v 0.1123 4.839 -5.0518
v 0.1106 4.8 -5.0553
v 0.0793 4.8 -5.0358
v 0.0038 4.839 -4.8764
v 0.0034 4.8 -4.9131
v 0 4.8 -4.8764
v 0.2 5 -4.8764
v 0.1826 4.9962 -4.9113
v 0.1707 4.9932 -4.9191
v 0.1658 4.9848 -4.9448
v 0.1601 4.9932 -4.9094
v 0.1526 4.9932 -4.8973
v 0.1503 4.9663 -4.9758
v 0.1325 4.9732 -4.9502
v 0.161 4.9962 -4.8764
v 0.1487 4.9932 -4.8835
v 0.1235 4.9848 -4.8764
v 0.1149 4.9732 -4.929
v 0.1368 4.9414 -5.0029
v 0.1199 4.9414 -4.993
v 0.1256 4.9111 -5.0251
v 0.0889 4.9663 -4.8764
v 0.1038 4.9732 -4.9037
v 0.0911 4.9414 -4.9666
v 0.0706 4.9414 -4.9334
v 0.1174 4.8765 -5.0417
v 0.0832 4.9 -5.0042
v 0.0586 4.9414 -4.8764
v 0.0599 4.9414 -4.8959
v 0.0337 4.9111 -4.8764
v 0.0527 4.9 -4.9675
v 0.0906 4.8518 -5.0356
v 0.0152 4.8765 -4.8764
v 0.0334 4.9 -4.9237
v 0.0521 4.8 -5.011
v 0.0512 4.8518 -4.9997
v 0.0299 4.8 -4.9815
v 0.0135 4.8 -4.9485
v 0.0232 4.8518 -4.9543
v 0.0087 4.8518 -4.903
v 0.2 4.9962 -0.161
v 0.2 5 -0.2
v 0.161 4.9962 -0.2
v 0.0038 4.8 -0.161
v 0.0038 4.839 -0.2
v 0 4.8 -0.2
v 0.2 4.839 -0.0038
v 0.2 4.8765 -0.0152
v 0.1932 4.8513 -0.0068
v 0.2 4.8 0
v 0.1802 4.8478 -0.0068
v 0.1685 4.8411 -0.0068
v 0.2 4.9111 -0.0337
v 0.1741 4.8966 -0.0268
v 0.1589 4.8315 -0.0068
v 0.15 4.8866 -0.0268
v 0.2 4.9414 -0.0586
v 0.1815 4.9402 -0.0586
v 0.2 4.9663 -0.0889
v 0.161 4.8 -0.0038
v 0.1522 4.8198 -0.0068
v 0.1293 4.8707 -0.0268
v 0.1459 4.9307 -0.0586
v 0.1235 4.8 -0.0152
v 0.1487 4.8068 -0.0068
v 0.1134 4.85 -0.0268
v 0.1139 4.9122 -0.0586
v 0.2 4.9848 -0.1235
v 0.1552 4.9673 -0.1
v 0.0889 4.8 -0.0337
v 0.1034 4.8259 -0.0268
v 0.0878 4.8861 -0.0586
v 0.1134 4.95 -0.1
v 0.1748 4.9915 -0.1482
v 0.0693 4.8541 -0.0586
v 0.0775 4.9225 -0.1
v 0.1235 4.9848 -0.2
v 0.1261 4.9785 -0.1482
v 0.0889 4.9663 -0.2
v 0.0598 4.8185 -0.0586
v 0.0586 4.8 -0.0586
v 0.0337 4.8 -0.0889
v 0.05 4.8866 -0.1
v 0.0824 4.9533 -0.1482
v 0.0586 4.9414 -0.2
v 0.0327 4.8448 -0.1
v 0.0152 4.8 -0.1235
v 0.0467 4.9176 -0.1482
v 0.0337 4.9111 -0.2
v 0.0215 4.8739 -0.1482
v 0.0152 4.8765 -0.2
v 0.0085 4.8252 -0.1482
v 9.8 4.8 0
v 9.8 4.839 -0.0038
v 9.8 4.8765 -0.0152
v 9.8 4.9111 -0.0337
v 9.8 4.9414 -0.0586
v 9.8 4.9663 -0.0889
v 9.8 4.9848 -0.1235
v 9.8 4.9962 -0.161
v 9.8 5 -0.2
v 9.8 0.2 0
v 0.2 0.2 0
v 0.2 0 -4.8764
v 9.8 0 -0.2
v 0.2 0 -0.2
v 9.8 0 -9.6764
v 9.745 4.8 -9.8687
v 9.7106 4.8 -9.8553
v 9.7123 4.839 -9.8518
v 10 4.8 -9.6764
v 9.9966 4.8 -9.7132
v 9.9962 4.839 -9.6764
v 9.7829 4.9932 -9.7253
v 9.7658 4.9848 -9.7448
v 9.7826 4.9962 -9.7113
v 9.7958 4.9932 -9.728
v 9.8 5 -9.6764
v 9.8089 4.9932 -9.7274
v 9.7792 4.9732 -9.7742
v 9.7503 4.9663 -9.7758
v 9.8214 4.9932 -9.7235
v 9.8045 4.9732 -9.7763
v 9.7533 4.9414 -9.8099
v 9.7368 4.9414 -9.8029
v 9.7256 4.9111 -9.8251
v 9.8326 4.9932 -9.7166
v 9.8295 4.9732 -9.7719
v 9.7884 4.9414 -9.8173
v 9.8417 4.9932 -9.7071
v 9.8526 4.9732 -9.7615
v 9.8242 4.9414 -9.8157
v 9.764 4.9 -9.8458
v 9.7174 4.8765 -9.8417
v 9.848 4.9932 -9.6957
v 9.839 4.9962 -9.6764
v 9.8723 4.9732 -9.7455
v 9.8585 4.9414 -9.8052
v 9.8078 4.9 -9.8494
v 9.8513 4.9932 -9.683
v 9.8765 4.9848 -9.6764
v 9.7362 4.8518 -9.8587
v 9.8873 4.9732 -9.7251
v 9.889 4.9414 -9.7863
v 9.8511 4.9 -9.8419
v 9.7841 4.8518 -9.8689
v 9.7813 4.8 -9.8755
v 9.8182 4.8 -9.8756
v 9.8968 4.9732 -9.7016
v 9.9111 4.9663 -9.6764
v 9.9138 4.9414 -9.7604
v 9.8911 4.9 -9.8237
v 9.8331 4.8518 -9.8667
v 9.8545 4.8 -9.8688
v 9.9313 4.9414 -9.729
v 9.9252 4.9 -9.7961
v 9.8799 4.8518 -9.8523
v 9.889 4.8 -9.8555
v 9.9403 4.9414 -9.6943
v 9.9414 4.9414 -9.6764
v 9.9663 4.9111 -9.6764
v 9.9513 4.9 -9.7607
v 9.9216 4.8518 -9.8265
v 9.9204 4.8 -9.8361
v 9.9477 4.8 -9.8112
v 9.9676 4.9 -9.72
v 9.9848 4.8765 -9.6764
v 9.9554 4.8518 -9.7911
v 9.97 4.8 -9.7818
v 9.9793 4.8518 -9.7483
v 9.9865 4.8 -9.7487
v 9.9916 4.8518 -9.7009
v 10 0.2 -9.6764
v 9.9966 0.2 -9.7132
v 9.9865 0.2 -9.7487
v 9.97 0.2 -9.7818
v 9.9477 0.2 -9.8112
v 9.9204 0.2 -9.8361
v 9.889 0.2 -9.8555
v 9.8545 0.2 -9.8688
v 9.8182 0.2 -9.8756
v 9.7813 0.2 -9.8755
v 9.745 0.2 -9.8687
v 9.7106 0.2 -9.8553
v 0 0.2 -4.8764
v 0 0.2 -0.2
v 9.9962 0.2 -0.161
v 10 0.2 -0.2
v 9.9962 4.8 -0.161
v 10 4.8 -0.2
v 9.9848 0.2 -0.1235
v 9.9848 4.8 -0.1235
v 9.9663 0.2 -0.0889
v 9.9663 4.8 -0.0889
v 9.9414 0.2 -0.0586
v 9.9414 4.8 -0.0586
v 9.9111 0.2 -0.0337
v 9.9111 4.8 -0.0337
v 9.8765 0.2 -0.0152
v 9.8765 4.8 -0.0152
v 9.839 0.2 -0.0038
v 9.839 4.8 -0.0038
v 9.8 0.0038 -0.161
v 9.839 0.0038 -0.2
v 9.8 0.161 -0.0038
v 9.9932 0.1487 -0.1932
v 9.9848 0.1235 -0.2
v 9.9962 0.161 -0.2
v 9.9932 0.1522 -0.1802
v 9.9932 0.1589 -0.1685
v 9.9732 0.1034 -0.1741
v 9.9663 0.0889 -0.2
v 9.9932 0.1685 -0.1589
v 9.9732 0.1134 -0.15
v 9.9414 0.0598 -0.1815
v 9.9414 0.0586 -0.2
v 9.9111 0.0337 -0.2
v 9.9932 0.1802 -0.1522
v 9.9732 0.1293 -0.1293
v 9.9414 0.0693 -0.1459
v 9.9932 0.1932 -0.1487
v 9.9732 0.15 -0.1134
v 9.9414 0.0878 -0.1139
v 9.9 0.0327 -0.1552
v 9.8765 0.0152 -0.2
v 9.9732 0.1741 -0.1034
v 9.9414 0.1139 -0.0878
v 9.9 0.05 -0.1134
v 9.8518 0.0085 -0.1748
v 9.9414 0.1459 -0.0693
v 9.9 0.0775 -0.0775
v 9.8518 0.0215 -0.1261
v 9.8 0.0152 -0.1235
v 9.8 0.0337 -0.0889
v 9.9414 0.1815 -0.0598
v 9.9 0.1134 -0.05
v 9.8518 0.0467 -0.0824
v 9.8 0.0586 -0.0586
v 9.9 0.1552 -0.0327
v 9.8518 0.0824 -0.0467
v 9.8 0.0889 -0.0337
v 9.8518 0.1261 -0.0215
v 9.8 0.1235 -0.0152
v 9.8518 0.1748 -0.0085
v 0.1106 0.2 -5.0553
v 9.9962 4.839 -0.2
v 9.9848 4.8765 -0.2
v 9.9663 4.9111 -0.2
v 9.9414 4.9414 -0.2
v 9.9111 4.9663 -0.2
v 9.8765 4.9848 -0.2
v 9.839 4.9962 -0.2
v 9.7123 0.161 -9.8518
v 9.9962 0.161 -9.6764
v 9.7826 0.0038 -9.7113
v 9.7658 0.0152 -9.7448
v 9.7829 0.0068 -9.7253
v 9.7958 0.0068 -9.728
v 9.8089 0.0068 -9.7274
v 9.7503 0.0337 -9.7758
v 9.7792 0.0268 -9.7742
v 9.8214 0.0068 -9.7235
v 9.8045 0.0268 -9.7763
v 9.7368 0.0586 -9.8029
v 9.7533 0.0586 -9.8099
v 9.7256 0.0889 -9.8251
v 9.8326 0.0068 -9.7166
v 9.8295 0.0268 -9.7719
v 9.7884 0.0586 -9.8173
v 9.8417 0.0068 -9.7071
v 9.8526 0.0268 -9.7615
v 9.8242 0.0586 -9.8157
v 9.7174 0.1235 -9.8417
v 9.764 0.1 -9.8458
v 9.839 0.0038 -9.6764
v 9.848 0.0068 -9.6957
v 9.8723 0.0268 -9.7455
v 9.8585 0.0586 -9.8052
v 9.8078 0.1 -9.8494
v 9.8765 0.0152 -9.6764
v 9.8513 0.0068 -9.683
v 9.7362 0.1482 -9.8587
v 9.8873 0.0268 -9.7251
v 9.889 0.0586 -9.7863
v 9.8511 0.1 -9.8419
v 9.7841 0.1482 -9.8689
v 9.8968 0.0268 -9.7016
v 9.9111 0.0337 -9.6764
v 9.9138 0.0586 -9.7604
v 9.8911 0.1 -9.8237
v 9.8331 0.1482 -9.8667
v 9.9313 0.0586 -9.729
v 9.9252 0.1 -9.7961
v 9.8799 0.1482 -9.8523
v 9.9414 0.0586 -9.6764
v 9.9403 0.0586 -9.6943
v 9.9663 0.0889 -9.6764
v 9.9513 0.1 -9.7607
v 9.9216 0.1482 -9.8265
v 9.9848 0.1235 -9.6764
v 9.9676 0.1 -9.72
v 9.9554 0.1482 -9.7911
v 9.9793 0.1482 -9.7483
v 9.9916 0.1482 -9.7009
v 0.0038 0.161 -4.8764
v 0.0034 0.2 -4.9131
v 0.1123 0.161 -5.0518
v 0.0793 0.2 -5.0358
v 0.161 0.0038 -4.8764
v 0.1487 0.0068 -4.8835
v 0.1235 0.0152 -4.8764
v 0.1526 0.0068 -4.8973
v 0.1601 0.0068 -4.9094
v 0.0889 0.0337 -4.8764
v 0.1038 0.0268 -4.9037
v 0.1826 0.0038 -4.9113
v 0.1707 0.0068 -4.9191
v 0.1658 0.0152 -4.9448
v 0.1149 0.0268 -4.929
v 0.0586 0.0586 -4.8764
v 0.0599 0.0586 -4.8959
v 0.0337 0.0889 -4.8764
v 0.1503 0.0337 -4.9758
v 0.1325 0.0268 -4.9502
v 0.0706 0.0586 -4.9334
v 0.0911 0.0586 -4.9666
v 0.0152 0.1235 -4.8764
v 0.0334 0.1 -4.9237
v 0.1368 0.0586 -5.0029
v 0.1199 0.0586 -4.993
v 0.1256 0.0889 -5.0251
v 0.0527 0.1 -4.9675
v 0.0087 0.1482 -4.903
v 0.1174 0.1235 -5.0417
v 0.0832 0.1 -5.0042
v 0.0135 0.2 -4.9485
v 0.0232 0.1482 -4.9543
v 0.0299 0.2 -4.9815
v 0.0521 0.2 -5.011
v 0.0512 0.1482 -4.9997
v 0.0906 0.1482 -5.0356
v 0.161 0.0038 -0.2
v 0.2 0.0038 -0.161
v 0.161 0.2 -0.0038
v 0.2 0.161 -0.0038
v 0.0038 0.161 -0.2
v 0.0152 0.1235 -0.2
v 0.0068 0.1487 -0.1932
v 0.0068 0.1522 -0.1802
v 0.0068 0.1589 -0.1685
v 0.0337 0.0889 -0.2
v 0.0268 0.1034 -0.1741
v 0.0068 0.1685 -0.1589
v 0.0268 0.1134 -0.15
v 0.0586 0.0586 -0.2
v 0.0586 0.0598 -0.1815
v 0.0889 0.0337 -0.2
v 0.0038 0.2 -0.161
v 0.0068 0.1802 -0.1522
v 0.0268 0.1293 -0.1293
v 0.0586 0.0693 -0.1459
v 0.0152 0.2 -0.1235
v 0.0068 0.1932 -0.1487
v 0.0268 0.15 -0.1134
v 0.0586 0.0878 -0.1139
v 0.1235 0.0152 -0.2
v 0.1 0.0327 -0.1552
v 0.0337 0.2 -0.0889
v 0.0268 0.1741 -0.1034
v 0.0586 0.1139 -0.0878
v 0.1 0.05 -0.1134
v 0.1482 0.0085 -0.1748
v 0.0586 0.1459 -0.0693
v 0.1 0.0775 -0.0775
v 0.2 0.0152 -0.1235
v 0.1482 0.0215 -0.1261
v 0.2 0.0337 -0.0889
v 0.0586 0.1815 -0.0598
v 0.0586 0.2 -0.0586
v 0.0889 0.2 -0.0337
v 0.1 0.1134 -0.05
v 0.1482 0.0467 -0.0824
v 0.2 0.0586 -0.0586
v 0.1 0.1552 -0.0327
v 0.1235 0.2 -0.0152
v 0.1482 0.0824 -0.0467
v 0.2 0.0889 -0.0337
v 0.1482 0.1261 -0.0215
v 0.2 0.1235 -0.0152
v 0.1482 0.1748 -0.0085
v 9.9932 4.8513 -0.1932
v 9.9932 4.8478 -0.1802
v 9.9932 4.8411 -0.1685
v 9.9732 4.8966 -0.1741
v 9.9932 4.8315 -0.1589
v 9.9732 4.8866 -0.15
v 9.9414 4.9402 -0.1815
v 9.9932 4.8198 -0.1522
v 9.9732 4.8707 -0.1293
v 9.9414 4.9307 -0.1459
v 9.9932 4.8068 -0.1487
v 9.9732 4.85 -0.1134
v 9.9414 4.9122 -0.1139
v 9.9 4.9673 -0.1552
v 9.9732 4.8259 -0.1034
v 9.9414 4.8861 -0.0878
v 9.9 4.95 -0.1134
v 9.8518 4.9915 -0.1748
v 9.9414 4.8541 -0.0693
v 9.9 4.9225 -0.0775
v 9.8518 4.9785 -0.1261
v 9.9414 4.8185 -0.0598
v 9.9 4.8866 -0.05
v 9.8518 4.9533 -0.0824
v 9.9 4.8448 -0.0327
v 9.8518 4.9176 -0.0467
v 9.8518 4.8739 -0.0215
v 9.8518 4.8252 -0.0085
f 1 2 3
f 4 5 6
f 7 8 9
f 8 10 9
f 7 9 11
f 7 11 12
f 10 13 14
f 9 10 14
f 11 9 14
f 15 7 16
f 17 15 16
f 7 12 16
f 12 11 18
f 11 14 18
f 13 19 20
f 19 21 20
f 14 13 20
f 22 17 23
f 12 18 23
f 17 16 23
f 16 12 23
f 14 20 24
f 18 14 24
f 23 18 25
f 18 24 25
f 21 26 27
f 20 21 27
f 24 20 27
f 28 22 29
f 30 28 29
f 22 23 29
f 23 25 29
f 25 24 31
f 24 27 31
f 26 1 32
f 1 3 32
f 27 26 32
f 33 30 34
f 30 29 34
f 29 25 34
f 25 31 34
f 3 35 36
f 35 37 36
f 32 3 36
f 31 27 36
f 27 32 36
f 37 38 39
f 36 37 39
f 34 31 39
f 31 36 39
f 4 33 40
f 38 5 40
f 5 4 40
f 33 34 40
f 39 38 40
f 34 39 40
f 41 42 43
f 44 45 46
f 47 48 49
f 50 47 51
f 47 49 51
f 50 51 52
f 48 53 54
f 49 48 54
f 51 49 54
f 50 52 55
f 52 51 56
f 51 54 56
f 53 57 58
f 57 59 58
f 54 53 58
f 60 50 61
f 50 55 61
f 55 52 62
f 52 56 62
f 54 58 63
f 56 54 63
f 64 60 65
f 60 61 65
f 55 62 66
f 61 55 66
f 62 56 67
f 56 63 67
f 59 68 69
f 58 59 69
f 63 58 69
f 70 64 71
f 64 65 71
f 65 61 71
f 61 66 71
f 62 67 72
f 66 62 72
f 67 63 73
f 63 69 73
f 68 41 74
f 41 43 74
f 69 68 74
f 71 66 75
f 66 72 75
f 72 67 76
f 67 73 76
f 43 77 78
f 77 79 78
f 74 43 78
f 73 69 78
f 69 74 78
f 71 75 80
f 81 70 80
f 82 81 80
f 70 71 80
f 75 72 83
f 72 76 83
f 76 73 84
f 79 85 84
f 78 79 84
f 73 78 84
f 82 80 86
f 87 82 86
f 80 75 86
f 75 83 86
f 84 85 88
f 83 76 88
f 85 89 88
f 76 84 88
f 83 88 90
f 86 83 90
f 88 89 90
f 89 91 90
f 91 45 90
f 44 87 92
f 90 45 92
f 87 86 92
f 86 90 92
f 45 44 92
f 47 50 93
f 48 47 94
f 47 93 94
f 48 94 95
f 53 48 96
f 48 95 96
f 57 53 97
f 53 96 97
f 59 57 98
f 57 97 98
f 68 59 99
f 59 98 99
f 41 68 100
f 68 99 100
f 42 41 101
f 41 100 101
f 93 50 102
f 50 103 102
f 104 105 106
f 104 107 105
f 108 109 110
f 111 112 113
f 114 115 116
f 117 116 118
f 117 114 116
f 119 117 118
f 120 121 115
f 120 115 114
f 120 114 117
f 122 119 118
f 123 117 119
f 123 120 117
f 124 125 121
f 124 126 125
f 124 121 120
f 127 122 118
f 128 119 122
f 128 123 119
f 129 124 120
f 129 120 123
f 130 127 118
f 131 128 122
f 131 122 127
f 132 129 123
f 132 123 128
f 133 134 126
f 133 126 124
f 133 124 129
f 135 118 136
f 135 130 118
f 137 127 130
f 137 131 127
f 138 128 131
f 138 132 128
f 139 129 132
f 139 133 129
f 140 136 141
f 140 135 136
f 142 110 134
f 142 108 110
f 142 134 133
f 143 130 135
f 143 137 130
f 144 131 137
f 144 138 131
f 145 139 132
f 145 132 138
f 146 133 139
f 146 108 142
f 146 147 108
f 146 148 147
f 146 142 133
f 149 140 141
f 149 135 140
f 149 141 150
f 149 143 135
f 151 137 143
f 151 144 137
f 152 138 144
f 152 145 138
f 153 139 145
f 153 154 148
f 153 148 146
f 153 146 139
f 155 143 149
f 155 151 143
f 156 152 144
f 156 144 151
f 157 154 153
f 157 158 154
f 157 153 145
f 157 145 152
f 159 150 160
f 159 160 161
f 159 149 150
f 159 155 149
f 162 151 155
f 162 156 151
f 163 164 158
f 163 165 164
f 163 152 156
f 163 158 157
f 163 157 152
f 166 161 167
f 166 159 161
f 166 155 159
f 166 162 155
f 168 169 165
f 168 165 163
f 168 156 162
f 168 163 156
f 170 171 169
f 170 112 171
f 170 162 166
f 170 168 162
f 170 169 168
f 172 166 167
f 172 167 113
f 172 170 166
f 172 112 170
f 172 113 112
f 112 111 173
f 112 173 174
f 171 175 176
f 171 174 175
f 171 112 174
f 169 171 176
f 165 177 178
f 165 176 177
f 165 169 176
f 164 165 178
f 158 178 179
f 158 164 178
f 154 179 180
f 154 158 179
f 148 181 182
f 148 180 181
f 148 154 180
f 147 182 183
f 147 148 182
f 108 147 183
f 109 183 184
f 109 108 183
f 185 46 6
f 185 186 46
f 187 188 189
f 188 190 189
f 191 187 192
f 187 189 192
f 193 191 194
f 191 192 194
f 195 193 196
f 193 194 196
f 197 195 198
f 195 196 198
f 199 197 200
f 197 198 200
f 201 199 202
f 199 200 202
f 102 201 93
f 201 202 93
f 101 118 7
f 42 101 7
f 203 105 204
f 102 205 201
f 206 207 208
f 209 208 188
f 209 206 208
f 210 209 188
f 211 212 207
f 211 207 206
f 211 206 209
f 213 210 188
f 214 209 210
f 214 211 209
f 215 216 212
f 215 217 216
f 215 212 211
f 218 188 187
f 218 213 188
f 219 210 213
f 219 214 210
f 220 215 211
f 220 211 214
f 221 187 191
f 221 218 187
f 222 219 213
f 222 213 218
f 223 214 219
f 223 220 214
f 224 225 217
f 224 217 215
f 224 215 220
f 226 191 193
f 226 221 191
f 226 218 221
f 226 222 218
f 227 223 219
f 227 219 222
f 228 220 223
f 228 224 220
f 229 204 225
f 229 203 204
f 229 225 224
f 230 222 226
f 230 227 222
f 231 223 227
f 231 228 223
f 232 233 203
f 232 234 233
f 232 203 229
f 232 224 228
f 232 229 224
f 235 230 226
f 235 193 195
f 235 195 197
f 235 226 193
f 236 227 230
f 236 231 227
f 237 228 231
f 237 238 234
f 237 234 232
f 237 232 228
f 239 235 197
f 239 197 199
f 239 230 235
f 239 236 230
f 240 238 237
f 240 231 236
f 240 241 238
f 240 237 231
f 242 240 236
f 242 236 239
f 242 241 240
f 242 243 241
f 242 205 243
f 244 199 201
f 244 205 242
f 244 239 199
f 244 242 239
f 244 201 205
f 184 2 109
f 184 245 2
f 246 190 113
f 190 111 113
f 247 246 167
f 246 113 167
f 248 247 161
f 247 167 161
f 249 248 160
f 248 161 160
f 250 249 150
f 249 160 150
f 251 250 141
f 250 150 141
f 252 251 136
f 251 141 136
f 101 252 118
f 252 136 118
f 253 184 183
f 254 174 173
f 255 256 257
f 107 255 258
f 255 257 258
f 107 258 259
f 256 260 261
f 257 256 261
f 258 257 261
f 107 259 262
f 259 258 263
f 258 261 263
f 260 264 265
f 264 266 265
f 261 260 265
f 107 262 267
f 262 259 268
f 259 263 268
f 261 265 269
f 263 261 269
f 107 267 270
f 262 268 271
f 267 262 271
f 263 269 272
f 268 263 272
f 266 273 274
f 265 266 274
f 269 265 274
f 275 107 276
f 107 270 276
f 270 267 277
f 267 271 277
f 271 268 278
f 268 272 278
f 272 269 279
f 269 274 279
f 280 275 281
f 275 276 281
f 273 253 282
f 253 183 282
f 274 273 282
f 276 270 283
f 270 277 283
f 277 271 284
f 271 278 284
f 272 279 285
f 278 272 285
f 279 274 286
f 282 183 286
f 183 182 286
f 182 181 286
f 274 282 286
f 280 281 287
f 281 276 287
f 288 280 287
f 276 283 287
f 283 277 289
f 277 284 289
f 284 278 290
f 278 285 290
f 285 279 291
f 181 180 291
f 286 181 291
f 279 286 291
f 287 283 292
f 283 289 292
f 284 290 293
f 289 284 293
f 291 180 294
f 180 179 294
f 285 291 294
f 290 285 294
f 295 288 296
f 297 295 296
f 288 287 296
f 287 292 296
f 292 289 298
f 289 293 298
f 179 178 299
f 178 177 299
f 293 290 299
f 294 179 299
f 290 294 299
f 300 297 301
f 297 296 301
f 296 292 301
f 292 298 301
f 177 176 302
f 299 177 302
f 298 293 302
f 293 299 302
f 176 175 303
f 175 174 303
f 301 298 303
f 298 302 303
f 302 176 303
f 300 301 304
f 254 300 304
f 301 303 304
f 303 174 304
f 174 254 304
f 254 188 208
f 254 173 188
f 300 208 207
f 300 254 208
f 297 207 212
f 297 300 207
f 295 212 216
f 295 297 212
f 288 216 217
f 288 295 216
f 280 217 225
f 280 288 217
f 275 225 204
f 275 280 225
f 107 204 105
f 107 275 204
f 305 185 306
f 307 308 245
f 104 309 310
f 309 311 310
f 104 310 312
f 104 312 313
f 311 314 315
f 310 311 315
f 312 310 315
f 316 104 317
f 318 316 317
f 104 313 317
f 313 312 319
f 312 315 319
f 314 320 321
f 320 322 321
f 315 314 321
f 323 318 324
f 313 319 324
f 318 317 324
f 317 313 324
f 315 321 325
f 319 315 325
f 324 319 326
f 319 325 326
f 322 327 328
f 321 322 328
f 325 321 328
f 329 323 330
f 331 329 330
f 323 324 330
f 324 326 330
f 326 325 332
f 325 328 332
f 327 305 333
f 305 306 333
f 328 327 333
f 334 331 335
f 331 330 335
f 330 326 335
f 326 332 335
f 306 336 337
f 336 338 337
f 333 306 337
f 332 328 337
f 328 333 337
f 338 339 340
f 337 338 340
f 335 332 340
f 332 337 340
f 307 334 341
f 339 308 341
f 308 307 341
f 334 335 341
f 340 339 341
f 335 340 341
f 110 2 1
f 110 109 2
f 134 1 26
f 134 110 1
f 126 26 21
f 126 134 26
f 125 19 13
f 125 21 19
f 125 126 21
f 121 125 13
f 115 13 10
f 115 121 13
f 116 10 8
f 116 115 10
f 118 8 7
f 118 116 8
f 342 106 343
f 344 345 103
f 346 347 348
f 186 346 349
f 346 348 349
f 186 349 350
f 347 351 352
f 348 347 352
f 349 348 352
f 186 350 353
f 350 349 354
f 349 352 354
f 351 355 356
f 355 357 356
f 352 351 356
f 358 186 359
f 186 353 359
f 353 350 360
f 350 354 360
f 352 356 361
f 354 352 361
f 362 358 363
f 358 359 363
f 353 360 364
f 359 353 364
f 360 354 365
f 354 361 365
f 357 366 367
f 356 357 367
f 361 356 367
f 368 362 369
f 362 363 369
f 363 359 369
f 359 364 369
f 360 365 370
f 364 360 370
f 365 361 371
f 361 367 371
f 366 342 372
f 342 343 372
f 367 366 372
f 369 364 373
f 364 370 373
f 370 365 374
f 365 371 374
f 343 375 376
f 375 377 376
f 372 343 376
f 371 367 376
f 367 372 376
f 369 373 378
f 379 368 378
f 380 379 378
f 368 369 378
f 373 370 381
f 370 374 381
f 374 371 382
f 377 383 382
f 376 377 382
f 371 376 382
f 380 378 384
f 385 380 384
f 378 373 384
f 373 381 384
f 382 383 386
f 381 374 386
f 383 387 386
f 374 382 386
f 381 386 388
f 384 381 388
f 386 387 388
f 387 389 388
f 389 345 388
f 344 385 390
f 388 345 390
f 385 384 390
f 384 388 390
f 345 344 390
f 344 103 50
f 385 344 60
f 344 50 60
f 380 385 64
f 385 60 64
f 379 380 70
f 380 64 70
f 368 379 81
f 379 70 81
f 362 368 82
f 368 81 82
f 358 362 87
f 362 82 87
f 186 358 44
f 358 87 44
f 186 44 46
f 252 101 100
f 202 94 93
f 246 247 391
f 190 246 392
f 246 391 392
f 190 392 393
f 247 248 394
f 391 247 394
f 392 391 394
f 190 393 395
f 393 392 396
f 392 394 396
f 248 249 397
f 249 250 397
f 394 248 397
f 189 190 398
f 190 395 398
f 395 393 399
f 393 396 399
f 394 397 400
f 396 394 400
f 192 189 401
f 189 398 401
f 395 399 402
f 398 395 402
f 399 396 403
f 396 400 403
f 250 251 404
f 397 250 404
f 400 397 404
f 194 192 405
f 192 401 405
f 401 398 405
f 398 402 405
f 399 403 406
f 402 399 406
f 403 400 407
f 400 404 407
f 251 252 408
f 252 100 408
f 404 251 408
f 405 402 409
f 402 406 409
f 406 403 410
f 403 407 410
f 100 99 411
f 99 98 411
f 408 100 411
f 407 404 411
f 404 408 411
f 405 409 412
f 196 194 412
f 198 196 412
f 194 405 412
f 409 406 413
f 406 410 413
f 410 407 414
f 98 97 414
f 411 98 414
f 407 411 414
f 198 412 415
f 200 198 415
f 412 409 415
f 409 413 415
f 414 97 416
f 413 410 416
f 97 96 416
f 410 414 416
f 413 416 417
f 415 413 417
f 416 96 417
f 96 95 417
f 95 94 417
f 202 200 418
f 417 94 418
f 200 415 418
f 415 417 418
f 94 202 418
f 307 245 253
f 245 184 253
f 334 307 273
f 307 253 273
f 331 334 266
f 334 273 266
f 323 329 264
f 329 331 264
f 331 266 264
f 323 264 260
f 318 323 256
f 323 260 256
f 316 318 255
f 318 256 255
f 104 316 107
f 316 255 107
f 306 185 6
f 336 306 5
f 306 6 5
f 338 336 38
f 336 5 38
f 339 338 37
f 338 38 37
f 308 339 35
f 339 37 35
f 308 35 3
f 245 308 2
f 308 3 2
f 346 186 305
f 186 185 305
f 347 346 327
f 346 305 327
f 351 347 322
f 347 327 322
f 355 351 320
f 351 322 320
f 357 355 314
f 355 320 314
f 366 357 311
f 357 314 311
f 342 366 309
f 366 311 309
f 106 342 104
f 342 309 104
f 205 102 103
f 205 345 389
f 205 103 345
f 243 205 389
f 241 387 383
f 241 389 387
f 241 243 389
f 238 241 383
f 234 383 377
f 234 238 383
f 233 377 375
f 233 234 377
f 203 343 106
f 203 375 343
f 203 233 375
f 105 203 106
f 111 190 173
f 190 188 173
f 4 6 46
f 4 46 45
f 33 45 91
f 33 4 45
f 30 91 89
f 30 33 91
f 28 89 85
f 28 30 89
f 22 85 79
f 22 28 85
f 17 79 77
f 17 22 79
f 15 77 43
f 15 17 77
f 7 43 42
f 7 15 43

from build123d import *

# Parameters (mm, degrees)
SKETCH1_W           = 10
SKETCH1_H           = 5
BOSS_EXTRUDE1_DEPTH = 5
FILLET1_R           = 0.2


with BuildPart() as part:
    # Sketch1 → Boss-Extrude1 (new body)
    with BuildSketch(Plane(origin=(0, 0, 0), x_dir=(1, 0, 0), z_dir=(0, 1, 0))):
        Polygon((10, 10), (10, 5), (0, 5), align=None)
        with Locations((5, 2.5)):
            Rectangle(SKETCH1_W, SKETCH1_H)
    extrude(amount=BOSS_EXTRUDE1_DEPTH)

    # Fillet1
    fillet1_edges = [part.edges().sort_by_distance(p)[0] for p in [
        (5, 5, -7.5),
        (0, 5, -2.5),
        (5, 5, 0),
        (10, 5, -5),
        (5, 0, 0),
        (0, 0, -2.5),
        (5, 0, -7.5),
        (10, 0, -5),
        (10, 2.5, 0),
        (0, 2.5, 0),
        (0, 2.5, -5),
        (10, 2.5, -10),
    ]]
    fillet(fillet1_edges, radius=FILLET1_R)


solid = part.part
